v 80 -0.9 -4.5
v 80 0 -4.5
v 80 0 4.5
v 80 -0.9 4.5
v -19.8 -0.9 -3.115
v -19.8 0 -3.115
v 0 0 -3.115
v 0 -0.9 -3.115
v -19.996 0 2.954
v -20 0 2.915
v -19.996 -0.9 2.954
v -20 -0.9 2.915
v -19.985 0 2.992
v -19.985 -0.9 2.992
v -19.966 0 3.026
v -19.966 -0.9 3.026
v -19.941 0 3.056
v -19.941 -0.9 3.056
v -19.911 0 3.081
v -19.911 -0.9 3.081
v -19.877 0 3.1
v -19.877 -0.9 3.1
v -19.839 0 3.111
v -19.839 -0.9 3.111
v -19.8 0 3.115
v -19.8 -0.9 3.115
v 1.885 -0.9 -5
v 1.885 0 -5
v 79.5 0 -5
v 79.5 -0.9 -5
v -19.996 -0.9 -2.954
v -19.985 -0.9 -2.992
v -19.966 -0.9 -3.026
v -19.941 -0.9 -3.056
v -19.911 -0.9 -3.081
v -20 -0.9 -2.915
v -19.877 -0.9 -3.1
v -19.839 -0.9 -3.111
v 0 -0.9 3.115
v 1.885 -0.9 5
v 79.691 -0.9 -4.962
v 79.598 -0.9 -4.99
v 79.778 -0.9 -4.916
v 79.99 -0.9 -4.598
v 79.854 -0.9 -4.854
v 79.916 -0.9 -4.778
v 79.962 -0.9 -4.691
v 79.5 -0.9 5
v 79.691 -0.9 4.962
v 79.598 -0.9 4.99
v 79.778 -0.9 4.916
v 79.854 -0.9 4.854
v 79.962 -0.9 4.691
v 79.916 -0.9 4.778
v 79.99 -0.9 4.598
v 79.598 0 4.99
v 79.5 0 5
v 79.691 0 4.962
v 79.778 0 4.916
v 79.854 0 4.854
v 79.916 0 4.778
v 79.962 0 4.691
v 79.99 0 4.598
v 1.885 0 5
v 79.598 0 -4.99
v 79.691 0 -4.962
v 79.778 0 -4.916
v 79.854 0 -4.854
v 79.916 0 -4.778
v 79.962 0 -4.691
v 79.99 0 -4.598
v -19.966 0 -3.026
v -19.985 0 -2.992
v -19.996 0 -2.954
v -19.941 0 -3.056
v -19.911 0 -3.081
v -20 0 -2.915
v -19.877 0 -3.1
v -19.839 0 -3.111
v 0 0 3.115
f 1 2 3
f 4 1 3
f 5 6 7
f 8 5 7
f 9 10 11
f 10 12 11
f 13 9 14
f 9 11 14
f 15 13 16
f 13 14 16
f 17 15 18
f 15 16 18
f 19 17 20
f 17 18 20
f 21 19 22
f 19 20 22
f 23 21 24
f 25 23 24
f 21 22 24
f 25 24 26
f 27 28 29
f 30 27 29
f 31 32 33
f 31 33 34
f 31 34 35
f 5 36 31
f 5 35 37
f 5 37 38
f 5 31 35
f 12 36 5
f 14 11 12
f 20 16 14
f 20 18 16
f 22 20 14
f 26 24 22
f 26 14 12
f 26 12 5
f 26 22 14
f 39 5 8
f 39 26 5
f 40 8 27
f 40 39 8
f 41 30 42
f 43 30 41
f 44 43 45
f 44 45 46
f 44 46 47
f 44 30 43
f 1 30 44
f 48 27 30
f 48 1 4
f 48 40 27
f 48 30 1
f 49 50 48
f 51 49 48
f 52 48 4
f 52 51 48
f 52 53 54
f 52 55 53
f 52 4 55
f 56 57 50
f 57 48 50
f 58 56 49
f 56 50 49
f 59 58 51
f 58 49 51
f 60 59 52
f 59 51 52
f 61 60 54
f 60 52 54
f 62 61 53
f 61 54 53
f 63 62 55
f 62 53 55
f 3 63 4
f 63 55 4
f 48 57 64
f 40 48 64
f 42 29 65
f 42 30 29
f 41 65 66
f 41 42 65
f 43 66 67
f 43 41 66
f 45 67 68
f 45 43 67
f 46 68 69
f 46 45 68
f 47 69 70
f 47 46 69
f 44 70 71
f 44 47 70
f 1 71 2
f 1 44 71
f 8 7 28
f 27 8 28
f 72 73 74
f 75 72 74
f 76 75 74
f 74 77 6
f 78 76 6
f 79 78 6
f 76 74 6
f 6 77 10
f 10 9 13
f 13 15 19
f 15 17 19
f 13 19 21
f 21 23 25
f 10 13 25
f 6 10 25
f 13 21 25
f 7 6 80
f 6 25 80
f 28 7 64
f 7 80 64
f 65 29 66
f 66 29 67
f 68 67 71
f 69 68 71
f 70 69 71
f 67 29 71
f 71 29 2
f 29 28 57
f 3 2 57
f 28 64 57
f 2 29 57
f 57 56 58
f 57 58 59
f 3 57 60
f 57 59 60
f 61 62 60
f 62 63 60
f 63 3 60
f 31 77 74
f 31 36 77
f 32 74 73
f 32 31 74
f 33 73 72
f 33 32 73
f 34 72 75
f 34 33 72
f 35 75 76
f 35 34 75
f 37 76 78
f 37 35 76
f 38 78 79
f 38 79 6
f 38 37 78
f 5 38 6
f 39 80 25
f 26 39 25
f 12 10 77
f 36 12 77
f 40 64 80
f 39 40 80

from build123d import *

# Parameters (mm, degrees)
F1_DEPTH = 0.9
F2_R     = 0.2
F3_R     = 0.5


with BuildPart() as f1:
    # F0 (on Front) → F1 (new body)
    with BuildSketch(Plane.XZ):
        Polygon((-20, 3.115), (-20, 0), (-20, -3.115), (0, -3.115), (1.885, -5), (80, -5), (80, 0), (80, 5), (1.885, 5), (0, 3.115), align=None)
    extrude(amount=F1_DEPTH)

    # F2
    f2_edges = [f1.edges().sort_by_distance(p)[0] for p in [
        (-20, -0.45, -3.115),
        (-20, -0.45, 3.115),
    ]]
    fillet(f2_edges, radius=F2_R)

    # F3
    f3_edges = [f1.edges().sort_by_distance(p)[0] for p in [
        (80, -0.45, -5),
        (80, -0.45, 5),
    ]]
    fillet(f3_edges, radius=F3_R)


solid = f1.part
